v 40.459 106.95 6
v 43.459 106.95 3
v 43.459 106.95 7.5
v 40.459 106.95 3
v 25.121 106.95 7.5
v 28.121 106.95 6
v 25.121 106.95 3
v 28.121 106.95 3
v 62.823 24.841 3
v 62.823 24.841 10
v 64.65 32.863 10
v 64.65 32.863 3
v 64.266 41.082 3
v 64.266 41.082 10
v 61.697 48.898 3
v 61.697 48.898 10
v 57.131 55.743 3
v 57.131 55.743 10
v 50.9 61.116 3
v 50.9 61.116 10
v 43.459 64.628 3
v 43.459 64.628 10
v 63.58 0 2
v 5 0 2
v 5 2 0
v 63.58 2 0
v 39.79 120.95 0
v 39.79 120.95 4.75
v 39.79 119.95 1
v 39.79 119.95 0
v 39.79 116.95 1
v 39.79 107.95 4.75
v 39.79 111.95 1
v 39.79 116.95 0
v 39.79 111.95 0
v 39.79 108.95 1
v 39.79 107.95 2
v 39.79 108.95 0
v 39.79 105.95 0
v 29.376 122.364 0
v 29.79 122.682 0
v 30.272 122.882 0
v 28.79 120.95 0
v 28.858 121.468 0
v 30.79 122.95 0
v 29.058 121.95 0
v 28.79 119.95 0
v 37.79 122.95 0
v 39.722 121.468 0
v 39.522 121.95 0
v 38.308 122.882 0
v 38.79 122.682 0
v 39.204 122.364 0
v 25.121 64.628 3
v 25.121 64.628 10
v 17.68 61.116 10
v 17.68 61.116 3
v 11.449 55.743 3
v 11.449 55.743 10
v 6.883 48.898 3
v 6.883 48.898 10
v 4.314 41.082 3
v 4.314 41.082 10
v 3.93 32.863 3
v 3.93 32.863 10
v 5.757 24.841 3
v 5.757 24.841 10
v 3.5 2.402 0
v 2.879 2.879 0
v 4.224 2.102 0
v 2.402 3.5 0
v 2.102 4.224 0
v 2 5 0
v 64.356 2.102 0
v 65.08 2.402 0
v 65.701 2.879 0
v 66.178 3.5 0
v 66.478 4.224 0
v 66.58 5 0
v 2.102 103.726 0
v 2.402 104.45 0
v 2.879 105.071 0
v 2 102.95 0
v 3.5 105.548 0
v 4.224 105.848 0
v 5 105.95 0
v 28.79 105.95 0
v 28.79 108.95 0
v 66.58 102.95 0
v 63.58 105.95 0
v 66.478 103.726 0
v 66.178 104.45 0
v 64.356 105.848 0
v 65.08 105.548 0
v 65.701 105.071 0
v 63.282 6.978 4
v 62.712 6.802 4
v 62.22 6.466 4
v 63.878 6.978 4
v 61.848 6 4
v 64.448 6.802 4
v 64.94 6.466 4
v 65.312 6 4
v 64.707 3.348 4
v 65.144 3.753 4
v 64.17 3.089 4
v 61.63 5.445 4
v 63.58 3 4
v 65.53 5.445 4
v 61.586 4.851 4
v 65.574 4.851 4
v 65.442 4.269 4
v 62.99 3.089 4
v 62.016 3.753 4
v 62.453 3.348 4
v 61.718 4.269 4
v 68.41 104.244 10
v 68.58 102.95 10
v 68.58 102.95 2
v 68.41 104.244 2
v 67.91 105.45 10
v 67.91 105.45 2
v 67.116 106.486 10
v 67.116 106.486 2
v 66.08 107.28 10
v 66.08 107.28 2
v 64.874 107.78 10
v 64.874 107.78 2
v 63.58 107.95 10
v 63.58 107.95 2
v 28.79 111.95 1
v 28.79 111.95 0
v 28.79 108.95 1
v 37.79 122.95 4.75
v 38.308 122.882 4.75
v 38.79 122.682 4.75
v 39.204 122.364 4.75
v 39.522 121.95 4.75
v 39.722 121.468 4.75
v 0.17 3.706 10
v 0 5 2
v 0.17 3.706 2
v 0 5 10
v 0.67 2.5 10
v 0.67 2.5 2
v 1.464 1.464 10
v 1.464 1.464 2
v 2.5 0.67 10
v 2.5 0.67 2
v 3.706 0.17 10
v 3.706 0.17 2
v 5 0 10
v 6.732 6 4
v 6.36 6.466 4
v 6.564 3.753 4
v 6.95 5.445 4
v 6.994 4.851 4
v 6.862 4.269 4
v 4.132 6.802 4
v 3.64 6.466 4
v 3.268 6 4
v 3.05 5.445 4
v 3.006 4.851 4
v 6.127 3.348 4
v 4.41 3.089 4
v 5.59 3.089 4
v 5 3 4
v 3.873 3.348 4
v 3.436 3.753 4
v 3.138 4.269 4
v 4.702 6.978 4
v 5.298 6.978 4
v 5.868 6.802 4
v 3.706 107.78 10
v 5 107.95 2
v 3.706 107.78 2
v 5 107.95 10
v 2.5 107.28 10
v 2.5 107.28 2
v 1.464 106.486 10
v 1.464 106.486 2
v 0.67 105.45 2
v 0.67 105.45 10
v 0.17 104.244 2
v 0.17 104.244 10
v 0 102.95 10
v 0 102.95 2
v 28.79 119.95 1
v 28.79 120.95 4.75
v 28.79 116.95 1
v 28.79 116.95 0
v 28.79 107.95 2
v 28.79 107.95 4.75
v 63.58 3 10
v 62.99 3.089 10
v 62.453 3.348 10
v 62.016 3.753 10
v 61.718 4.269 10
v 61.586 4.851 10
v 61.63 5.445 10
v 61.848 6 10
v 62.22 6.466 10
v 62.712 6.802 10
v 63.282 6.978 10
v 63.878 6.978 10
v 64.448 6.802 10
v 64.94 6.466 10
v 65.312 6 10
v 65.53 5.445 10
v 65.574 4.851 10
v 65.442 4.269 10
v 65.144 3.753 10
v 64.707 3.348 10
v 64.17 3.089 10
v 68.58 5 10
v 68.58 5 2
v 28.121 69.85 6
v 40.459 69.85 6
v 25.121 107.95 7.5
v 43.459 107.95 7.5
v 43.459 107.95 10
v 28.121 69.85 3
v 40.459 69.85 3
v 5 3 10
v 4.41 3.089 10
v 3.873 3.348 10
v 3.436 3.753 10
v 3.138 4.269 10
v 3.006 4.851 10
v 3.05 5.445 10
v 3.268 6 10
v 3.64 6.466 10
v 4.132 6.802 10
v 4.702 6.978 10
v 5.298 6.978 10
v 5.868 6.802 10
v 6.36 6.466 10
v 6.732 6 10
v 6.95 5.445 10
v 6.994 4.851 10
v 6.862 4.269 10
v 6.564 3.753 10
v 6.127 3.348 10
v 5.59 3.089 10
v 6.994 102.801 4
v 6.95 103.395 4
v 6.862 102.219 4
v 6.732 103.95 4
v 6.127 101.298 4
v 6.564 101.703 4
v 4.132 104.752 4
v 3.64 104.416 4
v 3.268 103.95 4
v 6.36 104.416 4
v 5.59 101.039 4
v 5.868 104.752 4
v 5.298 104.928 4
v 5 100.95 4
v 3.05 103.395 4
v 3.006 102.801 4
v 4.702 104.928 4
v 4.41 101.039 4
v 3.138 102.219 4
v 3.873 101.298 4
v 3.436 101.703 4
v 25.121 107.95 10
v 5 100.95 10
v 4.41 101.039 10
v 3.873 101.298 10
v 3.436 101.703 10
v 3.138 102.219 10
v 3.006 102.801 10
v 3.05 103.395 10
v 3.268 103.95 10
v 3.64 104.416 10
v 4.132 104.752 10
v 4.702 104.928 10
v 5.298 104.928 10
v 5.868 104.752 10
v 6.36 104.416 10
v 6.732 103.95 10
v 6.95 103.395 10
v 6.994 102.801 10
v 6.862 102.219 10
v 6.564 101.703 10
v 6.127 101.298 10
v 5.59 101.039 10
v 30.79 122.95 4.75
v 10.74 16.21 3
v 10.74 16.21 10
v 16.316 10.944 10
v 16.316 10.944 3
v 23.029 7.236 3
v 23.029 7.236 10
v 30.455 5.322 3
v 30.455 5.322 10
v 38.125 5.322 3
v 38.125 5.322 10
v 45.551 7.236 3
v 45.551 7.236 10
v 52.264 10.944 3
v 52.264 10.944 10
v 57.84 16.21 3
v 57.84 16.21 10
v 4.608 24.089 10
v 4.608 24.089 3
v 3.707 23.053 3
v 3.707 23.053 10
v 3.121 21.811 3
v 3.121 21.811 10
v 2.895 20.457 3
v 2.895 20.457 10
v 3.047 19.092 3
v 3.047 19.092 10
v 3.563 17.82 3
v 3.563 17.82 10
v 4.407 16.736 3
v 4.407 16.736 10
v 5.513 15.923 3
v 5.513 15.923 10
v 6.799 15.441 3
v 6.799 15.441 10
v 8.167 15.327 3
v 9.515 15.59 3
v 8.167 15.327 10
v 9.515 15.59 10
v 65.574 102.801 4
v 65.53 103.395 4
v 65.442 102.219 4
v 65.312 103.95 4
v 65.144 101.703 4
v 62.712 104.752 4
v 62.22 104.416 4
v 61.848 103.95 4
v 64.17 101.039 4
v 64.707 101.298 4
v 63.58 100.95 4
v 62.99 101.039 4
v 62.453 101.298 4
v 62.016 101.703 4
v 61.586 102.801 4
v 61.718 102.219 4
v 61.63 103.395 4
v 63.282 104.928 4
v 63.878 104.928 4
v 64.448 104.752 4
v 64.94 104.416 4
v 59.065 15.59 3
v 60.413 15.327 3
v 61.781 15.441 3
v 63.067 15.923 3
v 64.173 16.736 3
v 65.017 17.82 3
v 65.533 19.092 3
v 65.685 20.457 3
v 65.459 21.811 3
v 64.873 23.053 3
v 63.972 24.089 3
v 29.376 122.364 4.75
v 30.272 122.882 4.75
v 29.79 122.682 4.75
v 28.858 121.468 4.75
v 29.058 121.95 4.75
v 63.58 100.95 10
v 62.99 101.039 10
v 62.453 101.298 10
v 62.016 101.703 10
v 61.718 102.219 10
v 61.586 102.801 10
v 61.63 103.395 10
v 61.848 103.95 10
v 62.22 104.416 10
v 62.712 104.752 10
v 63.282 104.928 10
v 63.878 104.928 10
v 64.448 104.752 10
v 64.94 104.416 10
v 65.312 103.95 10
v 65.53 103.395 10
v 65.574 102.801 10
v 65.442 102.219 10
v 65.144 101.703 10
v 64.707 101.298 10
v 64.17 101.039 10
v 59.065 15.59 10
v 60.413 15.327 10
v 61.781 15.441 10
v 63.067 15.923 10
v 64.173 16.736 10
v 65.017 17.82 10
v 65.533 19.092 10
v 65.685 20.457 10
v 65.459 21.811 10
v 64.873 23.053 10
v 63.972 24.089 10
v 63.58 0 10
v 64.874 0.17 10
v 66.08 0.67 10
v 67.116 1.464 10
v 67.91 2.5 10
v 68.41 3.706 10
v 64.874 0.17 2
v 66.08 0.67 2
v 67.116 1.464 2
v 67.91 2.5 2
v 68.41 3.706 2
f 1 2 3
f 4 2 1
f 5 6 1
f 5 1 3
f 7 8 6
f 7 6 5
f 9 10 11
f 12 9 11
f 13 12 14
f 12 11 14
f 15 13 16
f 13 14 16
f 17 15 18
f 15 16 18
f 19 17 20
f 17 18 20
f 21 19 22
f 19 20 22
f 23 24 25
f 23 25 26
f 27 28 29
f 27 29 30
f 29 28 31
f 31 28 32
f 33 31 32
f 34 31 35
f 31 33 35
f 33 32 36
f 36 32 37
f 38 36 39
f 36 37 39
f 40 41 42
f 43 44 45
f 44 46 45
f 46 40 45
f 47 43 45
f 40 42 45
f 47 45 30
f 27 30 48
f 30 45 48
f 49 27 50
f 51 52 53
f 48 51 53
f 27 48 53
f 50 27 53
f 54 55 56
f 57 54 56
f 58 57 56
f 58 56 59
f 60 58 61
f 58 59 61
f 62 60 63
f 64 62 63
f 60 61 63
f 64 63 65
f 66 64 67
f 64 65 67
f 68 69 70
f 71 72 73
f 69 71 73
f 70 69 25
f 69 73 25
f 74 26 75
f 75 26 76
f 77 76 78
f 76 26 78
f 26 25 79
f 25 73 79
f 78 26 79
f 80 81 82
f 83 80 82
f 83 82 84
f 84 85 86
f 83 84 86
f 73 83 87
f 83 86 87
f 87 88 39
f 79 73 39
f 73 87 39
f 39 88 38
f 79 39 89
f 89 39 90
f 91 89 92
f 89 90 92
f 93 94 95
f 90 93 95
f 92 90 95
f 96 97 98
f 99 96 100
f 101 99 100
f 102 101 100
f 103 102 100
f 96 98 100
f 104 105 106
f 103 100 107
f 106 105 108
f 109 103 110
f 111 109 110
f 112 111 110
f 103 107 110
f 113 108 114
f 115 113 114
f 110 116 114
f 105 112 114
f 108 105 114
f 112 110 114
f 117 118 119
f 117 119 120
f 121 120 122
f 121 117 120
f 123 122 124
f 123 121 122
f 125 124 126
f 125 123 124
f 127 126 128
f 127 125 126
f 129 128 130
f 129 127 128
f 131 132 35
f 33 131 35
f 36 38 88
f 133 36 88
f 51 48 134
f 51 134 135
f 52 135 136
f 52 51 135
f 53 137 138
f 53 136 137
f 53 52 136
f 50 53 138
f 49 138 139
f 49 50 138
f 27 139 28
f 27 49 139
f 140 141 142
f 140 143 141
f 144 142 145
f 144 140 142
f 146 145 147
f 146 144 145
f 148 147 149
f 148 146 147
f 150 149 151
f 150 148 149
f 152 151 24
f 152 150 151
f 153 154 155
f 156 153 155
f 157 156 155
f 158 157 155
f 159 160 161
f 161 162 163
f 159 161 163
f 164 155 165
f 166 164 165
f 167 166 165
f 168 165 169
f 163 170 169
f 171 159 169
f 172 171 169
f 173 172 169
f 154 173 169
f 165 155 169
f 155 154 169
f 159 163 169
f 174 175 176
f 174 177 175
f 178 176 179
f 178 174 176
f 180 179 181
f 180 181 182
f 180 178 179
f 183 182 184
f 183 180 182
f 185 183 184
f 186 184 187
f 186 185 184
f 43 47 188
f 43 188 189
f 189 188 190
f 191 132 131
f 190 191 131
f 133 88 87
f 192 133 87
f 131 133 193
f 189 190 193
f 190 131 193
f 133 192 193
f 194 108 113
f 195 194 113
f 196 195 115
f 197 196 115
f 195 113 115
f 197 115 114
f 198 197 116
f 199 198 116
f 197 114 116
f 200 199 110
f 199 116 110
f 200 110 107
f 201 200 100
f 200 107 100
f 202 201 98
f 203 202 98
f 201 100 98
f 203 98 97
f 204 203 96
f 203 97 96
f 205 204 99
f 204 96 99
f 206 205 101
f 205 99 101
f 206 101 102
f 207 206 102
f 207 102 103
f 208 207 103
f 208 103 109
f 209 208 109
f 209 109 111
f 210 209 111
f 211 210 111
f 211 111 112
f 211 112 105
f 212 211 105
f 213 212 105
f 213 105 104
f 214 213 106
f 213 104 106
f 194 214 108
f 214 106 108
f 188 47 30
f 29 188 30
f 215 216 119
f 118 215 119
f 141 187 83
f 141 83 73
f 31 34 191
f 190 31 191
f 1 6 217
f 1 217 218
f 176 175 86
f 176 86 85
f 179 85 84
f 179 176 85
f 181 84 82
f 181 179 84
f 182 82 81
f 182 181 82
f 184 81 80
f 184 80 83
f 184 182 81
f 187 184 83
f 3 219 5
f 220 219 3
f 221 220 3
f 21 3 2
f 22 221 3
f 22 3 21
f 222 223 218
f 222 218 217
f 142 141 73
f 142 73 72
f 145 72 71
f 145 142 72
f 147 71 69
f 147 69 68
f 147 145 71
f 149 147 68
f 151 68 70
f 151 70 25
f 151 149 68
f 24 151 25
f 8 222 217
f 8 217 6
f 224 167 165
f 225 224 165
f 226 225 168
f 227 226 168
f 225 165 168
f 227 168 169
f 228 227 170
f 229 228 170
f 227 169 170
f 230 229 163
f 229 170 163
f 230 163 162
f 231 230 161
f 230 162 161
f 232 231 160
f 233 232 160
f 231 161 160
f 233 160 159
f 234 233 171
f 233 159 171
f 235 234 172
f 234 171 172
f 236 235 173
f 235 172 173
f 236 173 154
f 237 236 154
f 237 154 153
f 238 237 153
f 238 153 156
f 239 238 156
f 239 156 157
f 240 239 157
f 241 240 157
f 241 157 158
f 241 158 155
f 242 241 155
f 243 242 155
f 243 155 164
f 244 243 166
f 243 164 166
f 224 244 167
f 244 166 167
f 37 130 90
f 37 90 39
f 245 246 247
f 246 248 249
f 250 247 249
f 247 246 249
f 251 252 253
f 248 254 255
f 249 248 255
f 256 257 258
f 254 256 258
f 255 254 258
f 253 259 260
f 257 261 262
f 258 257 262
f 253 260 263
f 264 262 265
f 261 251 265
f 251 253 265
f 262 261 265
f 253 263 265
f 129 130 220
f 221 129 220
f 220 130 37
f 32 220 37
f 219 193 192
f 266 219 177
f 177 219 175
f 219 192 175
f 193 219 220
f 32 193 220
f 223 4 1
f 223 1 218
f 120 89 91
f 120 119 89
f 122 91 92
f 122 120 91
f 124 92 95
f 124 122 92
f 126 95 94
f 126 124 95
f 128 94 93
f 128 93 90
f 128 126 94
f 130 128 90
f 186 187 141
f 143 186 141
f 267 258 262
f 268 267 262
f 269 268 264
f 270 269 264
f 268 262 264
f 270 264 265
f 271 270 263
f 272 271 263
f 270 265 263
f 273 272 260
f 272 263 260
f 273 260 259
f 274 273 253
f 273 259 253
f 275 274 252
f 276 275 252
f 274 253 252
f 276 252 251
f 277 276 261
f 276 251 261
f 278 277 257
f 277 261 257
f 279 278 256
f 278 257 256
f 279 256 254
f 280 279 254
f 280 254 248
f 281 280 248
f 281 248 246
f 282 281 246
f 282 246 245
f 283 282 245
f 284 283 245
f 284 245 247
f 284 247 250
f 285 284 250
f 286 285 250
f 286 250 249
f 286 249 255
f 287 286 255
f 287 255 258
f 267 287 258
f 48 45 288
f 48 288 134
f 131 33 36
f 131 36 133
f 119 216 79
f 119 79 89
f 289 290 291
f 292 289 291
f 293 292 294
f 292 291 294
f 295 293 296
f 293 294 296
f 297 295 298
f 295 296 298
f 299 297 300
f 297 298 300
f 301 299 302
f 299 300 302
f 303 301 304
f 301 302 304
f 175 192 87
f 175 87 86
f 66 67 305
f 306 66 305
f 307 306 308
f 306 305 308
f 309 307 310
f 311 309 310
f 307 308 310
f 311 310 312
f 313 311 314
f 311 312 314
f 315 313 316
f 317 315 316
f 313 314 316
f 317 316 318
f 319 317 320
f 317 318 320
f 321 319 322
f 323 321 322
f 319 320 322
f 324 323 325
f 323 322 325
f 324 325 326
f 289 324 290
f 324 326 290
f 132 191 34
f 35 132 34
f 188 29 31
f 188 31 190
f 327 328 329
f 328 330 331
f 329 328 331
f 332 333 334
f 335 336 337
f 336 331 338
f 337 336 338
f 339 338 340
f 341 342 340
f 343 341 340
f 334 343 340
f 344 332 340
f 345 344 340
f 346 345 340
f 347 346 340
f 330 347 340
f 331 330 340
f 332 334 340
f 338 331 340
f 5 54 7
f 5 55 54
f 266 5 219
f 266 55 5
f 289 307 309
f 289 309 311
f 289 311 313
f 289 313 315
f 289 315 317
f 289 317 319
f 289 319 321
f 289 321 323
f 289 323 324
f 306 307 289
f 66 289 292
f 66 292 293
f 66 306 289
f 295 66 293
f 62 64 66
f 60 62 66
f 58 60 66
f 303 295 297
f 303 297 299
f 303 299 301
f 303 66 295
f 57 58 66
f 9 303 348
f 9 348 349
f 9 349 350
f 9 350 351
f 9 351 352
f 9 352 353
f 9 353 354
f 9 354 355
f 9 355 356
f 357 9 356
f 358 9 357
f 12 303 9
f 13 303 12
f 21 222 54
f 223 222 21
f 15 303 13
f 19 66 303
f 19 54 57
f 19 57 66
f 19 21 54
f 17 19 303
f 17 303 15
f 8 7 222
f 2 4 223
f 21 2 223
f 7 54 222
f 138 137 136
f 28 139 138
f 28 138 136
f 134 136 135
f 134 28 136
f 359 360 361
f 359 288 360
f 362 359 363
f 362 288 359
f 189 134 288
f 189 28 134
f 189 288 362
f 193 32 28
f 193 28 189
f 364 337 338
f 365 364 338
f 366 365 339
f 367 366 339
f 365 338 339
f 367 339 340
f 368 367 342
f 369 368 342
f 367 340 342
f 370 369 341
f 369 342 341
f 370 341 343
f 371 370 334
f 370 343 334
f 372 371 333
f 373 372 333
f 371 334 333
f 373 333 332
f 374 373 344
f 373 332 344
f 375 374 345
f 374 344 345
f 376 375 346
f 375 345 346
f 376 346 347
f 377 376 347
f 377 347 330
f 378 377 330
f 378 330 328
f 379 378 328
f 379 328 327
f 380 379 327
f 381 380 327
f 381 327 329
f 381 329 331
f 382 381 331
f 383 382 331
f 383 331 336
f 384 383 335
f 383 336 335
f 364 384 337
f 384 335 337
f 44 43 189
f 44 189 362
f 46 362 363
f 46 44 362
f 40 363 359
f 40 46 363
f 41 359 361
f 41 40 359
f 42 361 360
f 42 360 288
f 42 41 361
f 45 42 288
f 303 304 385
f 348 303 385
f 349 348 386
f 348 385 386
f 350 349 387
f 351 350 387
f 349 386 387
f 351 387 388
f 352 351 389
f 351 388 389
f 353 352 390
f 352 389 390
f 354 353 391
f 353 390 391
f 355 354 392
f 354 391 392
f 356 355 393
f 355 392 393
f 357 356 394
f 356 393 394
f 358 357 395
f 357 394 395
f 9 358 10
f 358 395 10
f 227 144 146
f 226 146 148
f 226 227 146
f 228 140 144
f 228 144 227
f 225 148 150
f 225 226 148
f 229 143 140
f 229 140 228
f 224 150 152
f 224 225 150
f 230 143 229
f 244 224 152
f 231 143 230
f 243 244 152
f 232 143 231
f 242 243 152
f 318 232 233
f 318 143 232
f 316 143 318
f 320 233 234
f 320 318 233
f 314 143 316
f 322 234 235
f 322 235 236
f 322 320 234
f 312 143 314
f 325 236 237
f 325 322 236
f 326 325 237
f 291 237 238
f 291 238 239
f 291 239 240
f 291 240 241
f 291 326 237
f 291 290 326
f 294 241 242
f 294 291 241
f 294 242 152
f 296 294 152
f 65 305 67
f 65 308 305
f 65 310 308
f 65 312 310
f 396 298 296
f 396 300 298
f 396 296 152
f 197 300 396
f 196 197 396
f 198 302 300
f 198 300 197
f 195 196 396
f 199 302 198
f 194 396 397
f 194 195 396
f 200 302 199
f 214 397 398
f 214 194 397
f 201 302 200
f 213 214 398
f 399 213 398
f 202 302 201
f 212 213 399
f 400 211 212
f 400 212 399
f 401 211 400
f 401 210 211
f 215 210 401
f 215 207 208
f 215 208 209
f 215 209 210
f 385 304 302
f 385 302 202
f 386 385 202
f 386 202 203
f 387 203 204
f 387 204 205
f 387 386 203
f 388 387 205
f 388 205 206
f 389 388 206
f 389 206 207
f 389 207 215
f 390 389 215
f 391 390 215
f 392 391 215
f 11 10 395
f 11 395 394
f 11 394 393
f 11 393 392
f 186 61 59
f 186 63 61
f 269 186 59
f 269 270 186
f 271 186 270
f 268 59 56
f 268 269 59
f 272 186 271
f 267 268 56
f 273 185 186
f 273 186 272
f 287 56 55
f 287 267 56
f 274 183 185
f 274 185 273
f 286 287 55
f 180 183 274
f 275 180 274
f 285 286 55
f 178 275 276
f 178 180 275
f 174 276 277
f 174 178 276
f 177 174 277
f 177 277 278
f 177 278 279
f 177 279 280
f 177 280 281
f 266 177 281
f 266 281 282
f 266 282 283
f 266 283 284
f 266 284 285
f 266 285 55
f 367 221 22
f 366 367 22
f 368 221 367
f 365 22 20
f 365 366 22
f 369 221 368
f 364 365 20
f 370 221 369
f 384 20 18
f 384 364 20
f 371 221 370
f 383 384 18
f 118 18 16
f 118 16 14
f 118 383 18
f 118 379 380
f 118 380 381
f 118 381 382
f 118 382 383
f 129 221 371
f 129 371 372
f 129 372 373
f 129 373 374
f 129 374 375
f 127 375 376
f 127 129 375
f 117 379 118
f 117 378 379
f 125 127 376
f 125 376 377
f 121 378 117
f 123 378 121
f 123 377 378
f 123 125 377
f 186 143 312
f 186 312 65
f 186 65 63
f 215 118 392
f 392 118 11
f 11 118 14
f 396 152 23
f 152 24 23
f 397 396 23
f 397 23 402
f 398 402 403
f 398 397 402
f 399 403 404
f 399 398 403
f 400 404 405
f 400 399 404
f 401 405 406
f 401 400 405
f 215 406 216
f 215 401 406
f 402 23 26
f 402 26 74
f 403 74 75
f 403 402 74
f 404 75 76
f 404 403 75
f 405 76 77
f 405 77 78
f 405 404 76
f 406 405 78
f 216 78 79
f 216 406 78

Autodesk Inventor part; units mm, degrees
ref_plane "YZ Plane" through (0, 0, 0) normal (1, 0, 0) x (0, 1, 0)
ref_plane "XZ Plane" through (0, 0, 0) normal (0, 1, 0) x (-1, 0, 0)
ref_plane "XY Plane" through (0, 0, 0) normal (0, 0, 1) x (1, 0, 0)
sketch "Sketch1" plane through (0, 0, 0) normal (0, 0, 1) x (1, 0, 0)
  line L0 (0, 0) -> (68.58, 0)
  line L1 (68.58, 0) -> (68.58, 107.95)
  line L2 (68.58, 107.95) -> (0, 107.95)
  line L3 (0, 107.95) -> (0, 0)
  dimension "d0" = 68.58
  dimension "d1" = 107.95
extrude "Extrusion1" add sketch "Sketch1" along normal blind 10
sketch "Sketch2" plane through (0, 0, 10) normal (0, 0, 1) x (1, 0, 0)
  circle A0 centre (34.29, 35.56) radius 30.48
  line L0 (0, 0) -> (68.58, 0) projected
  line L1 (68.58, 107.95) -> (0, 107.95) projected
  line L2 (25.1206, 107.95) -> (43.4594, 107.95)
  line L3 (43.4594, 107.95) -> (43.4594, 64.6281)
  line L4 (43.4594, 64.6281) -> (25.1206, 64.6281)
  line L5 (25.1206, 64.6281) -> (25.1206, 107.95)
  circle A1 centre (60.6865, 20.32) radius 5
  circle A2 centre (7.8935, 20.32) radius 5
  line L6 (7.8935, 20.32) -> (34.29, 66.04) construction
  line L7 (34.29, 66.04) -> (60.6865, 20.32) construction
  line L8 (60.6865, 20.32) -> (7.8935, 20.32) construction
  point P0 (34.29, 0)
  point P1 (34.29, 107.95)
  point P2 (57.8397, 16.2095)
  point P3 (62.8229, 24.8406)
  point P4 (10.7403, 16.2095)
  point P5 (5.7571, 24.8406)
  dimension "d4" = 18.3388
  dimension "d5" = 60.96
  dimension "d6" = 35.56
  dimension "d9" = 10
extrude "Extrusion2" cut sketch "Sketch2" against normal blind 7
sketch "Sketch4" plane through (0, 0, 3) normal (0, 0, 1) x (1, 0, 0)
  arc A0 (25.1206, 64.6281) -> (5.7571, 24.8406) centre (34.29, 35.56) ccw projected
  arc A1 (5.7571, 24.8406) -> (10.7403, 16.2095) centre (7.8935, 20.32) ccw projected
  arc A2 (10.7403, 16.2095) -> (57.8397, 16.2095) centre (34.29, 35.56) ccw projected
  arc A3 (57.8397, 16.2095) -> (62.8229, 24.8406) centre (60.6865, 20.32) ccw projected
  arc A4 (62.8229, 24.8406) -> (43.4594, 64.6281) centre (34.29, 35.56) ccw projected
  line L0 (43.4594, 107.95) -> (43.4594, 64.6281) projected
  line L1 (25.1206, 107.95) -> (43.4594, 107.95) projected
  line L2 (25.1206, 64.6281) -> (25.1206, 107.95) projected
  line L3 (25.1206, 64.6281) -> (25.1206, 107.95) projected
  line L4 (43.4594, 107.95) -> (43.4594, 64.6281) projected
  line L5 (25.1206, 107.95) -> (43.4594, 107.95)
  line L6 (43.4594, 107.95) -> (43.4594, 69.85)
  line L7 (43.4594, 69.85) -> (25.1206, 69.85)
  line L8 (25.1206, 69.85) -> (25.1206, 107.95)
  line L9 (25.1206, 107.95) -> (43.4594, 107.95) projected
  line L10 (28.1206, 107.95) -> (40.4594, 107.95)
  line L11 (40.4594, 107.95) -> (40.4594, 69.85)
  line L12 (40.4594, 69.85) -> (28.1206, 69.85)
  line L13 (28.1206, 69.85) -> (28.1206, 107.95)
  point P0 (0, 0)
  dimension "d17" = 3
  dimension "d18" = 3
  dimension "d19" = 38.1
extrude "Extrusion4" add sketch "Sketch4" along normal blind 3 contours L13 L1 L11 L7
sketch "Sketch3" plane through (0, 0, 3) normal (0, 0, 1) x (1, 0, 0)
  arc A0 (25.1206, 64.6281) -> (5.7571, 24.8406) centre (34.29, 35.56) ccw projected
  arc A1 (5.7571, 24.8406) -> (10.7403, 16.2095) centre (7.8935, 20.32) ccw projected
  arc A2 (10.7403, 16.2095) -> (57.8397, 16.2095) centre (34.29, 35.56) ccw projected
  arc A3 (57.8397, 16.2095) -> (62.8229, 24.8406) centre (60.6865, 20.32) ccw projected
  arc A4 (62.8229, 24.8406) -> (43.4594, 64.6281) centre (34.29, 35.56) ccw projected
  line L0 (43.4594, 107.95) -> (43.4594, 64.6281) projected
  line L1 (25.1206, 107.95) -> (28.1206, 107.95) projected
  line L2 (25.1206, 64.6281) -> (25.1206, 107.95) projected
  line L3 (25.1206, 64.6281) -> (25.1206, 107.95) projected
  line L4 (25.1206, 107.95) -> (43.4594, 107.95)
  line L5 (43.4594, 107.95) -> (43.4594, 106.95)
  line L6 (43.4594, 106.95) -> (25.1206, 106.95)
  line L7 (25.1206, 106.95) -> (25.1206, 107.95)
  line L8 (40.4594, 107.95) -> (40.4594, 69.85) projected
  line L9 (40.4594, 69.85) -> (28.1206, 69.85) projected
  line L10 (28.1206, 69.85) -> (28.1206, 107.95) projected
  line L11 (40.4594, 107.95) -> (43.4594, 107.95) projected
  point P0 (0, 0)
  point P1 (40.4594, 106.95)
  point P2 (28.1206, 106.95)
  dimension "d10" = 1
extrude "Extrusion3" add sketch "Sketch3" along normal blind 4.5 contours L2 L1 L10 L6 | L10 L4 L8 L6 | L8 L4 L0 L6
fillet "Fillet1" radius 5 4 edges at (0, 107.95, 5) (68.58, 107.95, 5) (68.58, 0, 5) (0, 0, 5)
chamfer "Chamfer1" distance 2 angle 45 8 edges at (34.29, 107.95, 0) (1.4645, 106.4855, 0) (0, 53.975, 0) (1.4645, 1.4645, 0) (34.29, 0, 0) (67.1155, 1.4645, 0) (68.58, 53.975, 0) (67.1155, 106.4855, 0)
sketch "Sketch6" plane through (0, 0, 10) normal (0, 0, 1) x (1, 0, 0)
  arc A0 (0, 5) -> (5, 0) centre (5, 5) ccw projected
  line L0 (5, 0) -> (63.58, 0) projected
  arc A1 (63.58, 0) -> (68.58, 5) centre (63.58, 5) ccw projected
  line L1 (68.58, 5) -> (68.58, 102.95) projected
  arc A2 (68.58, 102.95) -> (63.58, 107.95) centre (63.58, 102.95) ccw projected
  line L2 (63.58, 107.95) -> (43.4594, 107.95) projected
  line L3 (43.4594, 107.95) -> (43.4594, 64.6281) projected
  arc A3 (62.8229, 24.8406) -> (43.4594, 64.6281) centre (34.29, 35.56) ccw projected
  arc A4 (57.8397, 16.2095) -> (62.8229, 24.8406) centre (60.6865, 20.32) ccw projected
  arc A5 (10.7403, 16.2095) -> (57.8397, 16.2095) centre (34.29, 35.56) ccw projected
  arc A6 (5.7571, 24.8406) -> (10.7403, 16.2095) centre (7.8935, 20.32) ccw projected
  arc A7 (25.1206, 64.6281) -> (5.7571, 24.8406) centre (34.29, 35.56) ccw projected
  line L4 (25.1206, 64.6281) -> (25.1206, 107.95) projected
  line L5 (25.1206, 107.95) -> (5, 107.95) projected
  arc A8 (5, 107.95) -> (0, 102.95) centre (5, 102.95) ccw projected
  line L6 (0, 102.95) -> (0, 5) projected
  point P0 (0, 0)
hole "Hole2" at (5, 102.95, 10) at (5, 5, 10) at (63.58, 5, 10) at (63.58, 102.95, 10) direction (0, 0, -1) diameter 4 depth 6
sketch "Sketch7" plane through (25.1206, 107.95, 7.5) normal (0, 1, 0) x (1, 0, 0)
  line L0 (3.6694, -5.25) -> (14.6694, -5.25)
  line L1 (14.6694, -5.25) -> (14.6694, 2.75)
  line L2 (14.6694, 2.75) -> (3.6694, 2.75)
  line L3 (3.6694, 2.75) -> (3.6694, -5.25)
  line L4 (-20.1206, 5.5) -> (38.4594, 5.5) projected
  line L5 (-20.1206, -2.5) -> (-20.1206, 5.5) projected
  line L6 (0, -2.5) -> (-20.1206, -2.5) projected
  line L7 (0, -2.5) -> (0, 0) projected
  line L8 (18.3388, 0) -> (0, 0) projected
  line L9 (18.3388, 0) -> (18.3388, -2.5) projected
  line L10 (38.4594, -2.5) -> (18.3388, -2.5) projected
  line L11 (38.4594, 5.5) -> (38.4594, -2.5) projected
  line L12 (38.4594, 5.5) -> (-20.1206, 5.5) projected
  line L13 (3.6694, 2.75) -> (14.6694, 2.75)
  line L14 (14.6694, 2.75) -> (14.6694, 5.5)
  line L15 (14.6694, 5.5) -> (3.6694, 5.5)
  line L16 (3.6694, 5.5) -> (3.6694, 2.75)
  line L17 (3.6694, 5.5) -> (14.6694, 5.5)
  line L18 (14.6694, 5.5) -> (14.6694, 7.5)
  line L19 (14.6694, 7.5) -> (3.6694, 7.5)
  line L20 (3.6694, 7.5) -> (3.6694, 5.5)
  line L21 (38.4594, 7.5) -> (-20.1206, 7.5) projected
  point P0 (-25.1206, 7.5)
  point P1 (3.6694, -1.25)
  point P2 (0, -1.25)
  point P3 (9.1694, 2.75)
  point P4 (9.1694, 0)
  point P5 (14.6694, 2.75)
  dimension "d36" = 8
  dimension "d37" = 11
extrude "Extrusion5" add sketch "Sketch7" along normal blind 15 and the other way blind 5 contours L16 L4 L14 L2 | L20 L19 L18 L4
sketch "Sketch8" plane through (0, 0, 0) normal (0, 0, -1) x (-1, 0, 0)
  line L0 (-28.79, 107.95) -> (-28.79, 122.95) projected
  line L1 (-39.79, 105.95) -> (-39.79, 122.95) projected
  line L2 (-28.79, 119.95) -> (-39.79, 119.95)
  line L3 (-39.79, 119.95) -> (-39.79, 116.95)
  line L4 (-39.79, 116.95) -> (-28.79, 116.95)
  line L5 (-28.79, 116.95) -> (-28.79, 119.95)
  line L6 (-28.79, 111.95) -> (-39.79, 111.95)
  line L7 (-39.79, 111.95) -> (-39.79, 108.95)
  line L8 (-39.79, 108.95) -> (-28.79, 108.95)
  line L9 (-28.79, 108.95) -> (-28.79, 111.95)
  line L10 (-5, 107.95) -> (-28.79, 107.95) projected
  line L11 (-39.79, 122.95) -> (-28.79, 122.95) projected
  point P0 (0, 0)
  dimension "d42" = 3
  dimension "d43" = 3
  dimension "d44" = 1
  dimension "d45" = 3
extrude "Extrusion6" cut sketch "Sketch8" against normal blind 1 contours L8 L1 L6 L0 | L4 L1 L2 L0
fillet "Fillet2" radius 2 2 edges at (28.79, 122.95, 2.375) (39.79, 122.95, 2.375)
properties part number "Case Back"
